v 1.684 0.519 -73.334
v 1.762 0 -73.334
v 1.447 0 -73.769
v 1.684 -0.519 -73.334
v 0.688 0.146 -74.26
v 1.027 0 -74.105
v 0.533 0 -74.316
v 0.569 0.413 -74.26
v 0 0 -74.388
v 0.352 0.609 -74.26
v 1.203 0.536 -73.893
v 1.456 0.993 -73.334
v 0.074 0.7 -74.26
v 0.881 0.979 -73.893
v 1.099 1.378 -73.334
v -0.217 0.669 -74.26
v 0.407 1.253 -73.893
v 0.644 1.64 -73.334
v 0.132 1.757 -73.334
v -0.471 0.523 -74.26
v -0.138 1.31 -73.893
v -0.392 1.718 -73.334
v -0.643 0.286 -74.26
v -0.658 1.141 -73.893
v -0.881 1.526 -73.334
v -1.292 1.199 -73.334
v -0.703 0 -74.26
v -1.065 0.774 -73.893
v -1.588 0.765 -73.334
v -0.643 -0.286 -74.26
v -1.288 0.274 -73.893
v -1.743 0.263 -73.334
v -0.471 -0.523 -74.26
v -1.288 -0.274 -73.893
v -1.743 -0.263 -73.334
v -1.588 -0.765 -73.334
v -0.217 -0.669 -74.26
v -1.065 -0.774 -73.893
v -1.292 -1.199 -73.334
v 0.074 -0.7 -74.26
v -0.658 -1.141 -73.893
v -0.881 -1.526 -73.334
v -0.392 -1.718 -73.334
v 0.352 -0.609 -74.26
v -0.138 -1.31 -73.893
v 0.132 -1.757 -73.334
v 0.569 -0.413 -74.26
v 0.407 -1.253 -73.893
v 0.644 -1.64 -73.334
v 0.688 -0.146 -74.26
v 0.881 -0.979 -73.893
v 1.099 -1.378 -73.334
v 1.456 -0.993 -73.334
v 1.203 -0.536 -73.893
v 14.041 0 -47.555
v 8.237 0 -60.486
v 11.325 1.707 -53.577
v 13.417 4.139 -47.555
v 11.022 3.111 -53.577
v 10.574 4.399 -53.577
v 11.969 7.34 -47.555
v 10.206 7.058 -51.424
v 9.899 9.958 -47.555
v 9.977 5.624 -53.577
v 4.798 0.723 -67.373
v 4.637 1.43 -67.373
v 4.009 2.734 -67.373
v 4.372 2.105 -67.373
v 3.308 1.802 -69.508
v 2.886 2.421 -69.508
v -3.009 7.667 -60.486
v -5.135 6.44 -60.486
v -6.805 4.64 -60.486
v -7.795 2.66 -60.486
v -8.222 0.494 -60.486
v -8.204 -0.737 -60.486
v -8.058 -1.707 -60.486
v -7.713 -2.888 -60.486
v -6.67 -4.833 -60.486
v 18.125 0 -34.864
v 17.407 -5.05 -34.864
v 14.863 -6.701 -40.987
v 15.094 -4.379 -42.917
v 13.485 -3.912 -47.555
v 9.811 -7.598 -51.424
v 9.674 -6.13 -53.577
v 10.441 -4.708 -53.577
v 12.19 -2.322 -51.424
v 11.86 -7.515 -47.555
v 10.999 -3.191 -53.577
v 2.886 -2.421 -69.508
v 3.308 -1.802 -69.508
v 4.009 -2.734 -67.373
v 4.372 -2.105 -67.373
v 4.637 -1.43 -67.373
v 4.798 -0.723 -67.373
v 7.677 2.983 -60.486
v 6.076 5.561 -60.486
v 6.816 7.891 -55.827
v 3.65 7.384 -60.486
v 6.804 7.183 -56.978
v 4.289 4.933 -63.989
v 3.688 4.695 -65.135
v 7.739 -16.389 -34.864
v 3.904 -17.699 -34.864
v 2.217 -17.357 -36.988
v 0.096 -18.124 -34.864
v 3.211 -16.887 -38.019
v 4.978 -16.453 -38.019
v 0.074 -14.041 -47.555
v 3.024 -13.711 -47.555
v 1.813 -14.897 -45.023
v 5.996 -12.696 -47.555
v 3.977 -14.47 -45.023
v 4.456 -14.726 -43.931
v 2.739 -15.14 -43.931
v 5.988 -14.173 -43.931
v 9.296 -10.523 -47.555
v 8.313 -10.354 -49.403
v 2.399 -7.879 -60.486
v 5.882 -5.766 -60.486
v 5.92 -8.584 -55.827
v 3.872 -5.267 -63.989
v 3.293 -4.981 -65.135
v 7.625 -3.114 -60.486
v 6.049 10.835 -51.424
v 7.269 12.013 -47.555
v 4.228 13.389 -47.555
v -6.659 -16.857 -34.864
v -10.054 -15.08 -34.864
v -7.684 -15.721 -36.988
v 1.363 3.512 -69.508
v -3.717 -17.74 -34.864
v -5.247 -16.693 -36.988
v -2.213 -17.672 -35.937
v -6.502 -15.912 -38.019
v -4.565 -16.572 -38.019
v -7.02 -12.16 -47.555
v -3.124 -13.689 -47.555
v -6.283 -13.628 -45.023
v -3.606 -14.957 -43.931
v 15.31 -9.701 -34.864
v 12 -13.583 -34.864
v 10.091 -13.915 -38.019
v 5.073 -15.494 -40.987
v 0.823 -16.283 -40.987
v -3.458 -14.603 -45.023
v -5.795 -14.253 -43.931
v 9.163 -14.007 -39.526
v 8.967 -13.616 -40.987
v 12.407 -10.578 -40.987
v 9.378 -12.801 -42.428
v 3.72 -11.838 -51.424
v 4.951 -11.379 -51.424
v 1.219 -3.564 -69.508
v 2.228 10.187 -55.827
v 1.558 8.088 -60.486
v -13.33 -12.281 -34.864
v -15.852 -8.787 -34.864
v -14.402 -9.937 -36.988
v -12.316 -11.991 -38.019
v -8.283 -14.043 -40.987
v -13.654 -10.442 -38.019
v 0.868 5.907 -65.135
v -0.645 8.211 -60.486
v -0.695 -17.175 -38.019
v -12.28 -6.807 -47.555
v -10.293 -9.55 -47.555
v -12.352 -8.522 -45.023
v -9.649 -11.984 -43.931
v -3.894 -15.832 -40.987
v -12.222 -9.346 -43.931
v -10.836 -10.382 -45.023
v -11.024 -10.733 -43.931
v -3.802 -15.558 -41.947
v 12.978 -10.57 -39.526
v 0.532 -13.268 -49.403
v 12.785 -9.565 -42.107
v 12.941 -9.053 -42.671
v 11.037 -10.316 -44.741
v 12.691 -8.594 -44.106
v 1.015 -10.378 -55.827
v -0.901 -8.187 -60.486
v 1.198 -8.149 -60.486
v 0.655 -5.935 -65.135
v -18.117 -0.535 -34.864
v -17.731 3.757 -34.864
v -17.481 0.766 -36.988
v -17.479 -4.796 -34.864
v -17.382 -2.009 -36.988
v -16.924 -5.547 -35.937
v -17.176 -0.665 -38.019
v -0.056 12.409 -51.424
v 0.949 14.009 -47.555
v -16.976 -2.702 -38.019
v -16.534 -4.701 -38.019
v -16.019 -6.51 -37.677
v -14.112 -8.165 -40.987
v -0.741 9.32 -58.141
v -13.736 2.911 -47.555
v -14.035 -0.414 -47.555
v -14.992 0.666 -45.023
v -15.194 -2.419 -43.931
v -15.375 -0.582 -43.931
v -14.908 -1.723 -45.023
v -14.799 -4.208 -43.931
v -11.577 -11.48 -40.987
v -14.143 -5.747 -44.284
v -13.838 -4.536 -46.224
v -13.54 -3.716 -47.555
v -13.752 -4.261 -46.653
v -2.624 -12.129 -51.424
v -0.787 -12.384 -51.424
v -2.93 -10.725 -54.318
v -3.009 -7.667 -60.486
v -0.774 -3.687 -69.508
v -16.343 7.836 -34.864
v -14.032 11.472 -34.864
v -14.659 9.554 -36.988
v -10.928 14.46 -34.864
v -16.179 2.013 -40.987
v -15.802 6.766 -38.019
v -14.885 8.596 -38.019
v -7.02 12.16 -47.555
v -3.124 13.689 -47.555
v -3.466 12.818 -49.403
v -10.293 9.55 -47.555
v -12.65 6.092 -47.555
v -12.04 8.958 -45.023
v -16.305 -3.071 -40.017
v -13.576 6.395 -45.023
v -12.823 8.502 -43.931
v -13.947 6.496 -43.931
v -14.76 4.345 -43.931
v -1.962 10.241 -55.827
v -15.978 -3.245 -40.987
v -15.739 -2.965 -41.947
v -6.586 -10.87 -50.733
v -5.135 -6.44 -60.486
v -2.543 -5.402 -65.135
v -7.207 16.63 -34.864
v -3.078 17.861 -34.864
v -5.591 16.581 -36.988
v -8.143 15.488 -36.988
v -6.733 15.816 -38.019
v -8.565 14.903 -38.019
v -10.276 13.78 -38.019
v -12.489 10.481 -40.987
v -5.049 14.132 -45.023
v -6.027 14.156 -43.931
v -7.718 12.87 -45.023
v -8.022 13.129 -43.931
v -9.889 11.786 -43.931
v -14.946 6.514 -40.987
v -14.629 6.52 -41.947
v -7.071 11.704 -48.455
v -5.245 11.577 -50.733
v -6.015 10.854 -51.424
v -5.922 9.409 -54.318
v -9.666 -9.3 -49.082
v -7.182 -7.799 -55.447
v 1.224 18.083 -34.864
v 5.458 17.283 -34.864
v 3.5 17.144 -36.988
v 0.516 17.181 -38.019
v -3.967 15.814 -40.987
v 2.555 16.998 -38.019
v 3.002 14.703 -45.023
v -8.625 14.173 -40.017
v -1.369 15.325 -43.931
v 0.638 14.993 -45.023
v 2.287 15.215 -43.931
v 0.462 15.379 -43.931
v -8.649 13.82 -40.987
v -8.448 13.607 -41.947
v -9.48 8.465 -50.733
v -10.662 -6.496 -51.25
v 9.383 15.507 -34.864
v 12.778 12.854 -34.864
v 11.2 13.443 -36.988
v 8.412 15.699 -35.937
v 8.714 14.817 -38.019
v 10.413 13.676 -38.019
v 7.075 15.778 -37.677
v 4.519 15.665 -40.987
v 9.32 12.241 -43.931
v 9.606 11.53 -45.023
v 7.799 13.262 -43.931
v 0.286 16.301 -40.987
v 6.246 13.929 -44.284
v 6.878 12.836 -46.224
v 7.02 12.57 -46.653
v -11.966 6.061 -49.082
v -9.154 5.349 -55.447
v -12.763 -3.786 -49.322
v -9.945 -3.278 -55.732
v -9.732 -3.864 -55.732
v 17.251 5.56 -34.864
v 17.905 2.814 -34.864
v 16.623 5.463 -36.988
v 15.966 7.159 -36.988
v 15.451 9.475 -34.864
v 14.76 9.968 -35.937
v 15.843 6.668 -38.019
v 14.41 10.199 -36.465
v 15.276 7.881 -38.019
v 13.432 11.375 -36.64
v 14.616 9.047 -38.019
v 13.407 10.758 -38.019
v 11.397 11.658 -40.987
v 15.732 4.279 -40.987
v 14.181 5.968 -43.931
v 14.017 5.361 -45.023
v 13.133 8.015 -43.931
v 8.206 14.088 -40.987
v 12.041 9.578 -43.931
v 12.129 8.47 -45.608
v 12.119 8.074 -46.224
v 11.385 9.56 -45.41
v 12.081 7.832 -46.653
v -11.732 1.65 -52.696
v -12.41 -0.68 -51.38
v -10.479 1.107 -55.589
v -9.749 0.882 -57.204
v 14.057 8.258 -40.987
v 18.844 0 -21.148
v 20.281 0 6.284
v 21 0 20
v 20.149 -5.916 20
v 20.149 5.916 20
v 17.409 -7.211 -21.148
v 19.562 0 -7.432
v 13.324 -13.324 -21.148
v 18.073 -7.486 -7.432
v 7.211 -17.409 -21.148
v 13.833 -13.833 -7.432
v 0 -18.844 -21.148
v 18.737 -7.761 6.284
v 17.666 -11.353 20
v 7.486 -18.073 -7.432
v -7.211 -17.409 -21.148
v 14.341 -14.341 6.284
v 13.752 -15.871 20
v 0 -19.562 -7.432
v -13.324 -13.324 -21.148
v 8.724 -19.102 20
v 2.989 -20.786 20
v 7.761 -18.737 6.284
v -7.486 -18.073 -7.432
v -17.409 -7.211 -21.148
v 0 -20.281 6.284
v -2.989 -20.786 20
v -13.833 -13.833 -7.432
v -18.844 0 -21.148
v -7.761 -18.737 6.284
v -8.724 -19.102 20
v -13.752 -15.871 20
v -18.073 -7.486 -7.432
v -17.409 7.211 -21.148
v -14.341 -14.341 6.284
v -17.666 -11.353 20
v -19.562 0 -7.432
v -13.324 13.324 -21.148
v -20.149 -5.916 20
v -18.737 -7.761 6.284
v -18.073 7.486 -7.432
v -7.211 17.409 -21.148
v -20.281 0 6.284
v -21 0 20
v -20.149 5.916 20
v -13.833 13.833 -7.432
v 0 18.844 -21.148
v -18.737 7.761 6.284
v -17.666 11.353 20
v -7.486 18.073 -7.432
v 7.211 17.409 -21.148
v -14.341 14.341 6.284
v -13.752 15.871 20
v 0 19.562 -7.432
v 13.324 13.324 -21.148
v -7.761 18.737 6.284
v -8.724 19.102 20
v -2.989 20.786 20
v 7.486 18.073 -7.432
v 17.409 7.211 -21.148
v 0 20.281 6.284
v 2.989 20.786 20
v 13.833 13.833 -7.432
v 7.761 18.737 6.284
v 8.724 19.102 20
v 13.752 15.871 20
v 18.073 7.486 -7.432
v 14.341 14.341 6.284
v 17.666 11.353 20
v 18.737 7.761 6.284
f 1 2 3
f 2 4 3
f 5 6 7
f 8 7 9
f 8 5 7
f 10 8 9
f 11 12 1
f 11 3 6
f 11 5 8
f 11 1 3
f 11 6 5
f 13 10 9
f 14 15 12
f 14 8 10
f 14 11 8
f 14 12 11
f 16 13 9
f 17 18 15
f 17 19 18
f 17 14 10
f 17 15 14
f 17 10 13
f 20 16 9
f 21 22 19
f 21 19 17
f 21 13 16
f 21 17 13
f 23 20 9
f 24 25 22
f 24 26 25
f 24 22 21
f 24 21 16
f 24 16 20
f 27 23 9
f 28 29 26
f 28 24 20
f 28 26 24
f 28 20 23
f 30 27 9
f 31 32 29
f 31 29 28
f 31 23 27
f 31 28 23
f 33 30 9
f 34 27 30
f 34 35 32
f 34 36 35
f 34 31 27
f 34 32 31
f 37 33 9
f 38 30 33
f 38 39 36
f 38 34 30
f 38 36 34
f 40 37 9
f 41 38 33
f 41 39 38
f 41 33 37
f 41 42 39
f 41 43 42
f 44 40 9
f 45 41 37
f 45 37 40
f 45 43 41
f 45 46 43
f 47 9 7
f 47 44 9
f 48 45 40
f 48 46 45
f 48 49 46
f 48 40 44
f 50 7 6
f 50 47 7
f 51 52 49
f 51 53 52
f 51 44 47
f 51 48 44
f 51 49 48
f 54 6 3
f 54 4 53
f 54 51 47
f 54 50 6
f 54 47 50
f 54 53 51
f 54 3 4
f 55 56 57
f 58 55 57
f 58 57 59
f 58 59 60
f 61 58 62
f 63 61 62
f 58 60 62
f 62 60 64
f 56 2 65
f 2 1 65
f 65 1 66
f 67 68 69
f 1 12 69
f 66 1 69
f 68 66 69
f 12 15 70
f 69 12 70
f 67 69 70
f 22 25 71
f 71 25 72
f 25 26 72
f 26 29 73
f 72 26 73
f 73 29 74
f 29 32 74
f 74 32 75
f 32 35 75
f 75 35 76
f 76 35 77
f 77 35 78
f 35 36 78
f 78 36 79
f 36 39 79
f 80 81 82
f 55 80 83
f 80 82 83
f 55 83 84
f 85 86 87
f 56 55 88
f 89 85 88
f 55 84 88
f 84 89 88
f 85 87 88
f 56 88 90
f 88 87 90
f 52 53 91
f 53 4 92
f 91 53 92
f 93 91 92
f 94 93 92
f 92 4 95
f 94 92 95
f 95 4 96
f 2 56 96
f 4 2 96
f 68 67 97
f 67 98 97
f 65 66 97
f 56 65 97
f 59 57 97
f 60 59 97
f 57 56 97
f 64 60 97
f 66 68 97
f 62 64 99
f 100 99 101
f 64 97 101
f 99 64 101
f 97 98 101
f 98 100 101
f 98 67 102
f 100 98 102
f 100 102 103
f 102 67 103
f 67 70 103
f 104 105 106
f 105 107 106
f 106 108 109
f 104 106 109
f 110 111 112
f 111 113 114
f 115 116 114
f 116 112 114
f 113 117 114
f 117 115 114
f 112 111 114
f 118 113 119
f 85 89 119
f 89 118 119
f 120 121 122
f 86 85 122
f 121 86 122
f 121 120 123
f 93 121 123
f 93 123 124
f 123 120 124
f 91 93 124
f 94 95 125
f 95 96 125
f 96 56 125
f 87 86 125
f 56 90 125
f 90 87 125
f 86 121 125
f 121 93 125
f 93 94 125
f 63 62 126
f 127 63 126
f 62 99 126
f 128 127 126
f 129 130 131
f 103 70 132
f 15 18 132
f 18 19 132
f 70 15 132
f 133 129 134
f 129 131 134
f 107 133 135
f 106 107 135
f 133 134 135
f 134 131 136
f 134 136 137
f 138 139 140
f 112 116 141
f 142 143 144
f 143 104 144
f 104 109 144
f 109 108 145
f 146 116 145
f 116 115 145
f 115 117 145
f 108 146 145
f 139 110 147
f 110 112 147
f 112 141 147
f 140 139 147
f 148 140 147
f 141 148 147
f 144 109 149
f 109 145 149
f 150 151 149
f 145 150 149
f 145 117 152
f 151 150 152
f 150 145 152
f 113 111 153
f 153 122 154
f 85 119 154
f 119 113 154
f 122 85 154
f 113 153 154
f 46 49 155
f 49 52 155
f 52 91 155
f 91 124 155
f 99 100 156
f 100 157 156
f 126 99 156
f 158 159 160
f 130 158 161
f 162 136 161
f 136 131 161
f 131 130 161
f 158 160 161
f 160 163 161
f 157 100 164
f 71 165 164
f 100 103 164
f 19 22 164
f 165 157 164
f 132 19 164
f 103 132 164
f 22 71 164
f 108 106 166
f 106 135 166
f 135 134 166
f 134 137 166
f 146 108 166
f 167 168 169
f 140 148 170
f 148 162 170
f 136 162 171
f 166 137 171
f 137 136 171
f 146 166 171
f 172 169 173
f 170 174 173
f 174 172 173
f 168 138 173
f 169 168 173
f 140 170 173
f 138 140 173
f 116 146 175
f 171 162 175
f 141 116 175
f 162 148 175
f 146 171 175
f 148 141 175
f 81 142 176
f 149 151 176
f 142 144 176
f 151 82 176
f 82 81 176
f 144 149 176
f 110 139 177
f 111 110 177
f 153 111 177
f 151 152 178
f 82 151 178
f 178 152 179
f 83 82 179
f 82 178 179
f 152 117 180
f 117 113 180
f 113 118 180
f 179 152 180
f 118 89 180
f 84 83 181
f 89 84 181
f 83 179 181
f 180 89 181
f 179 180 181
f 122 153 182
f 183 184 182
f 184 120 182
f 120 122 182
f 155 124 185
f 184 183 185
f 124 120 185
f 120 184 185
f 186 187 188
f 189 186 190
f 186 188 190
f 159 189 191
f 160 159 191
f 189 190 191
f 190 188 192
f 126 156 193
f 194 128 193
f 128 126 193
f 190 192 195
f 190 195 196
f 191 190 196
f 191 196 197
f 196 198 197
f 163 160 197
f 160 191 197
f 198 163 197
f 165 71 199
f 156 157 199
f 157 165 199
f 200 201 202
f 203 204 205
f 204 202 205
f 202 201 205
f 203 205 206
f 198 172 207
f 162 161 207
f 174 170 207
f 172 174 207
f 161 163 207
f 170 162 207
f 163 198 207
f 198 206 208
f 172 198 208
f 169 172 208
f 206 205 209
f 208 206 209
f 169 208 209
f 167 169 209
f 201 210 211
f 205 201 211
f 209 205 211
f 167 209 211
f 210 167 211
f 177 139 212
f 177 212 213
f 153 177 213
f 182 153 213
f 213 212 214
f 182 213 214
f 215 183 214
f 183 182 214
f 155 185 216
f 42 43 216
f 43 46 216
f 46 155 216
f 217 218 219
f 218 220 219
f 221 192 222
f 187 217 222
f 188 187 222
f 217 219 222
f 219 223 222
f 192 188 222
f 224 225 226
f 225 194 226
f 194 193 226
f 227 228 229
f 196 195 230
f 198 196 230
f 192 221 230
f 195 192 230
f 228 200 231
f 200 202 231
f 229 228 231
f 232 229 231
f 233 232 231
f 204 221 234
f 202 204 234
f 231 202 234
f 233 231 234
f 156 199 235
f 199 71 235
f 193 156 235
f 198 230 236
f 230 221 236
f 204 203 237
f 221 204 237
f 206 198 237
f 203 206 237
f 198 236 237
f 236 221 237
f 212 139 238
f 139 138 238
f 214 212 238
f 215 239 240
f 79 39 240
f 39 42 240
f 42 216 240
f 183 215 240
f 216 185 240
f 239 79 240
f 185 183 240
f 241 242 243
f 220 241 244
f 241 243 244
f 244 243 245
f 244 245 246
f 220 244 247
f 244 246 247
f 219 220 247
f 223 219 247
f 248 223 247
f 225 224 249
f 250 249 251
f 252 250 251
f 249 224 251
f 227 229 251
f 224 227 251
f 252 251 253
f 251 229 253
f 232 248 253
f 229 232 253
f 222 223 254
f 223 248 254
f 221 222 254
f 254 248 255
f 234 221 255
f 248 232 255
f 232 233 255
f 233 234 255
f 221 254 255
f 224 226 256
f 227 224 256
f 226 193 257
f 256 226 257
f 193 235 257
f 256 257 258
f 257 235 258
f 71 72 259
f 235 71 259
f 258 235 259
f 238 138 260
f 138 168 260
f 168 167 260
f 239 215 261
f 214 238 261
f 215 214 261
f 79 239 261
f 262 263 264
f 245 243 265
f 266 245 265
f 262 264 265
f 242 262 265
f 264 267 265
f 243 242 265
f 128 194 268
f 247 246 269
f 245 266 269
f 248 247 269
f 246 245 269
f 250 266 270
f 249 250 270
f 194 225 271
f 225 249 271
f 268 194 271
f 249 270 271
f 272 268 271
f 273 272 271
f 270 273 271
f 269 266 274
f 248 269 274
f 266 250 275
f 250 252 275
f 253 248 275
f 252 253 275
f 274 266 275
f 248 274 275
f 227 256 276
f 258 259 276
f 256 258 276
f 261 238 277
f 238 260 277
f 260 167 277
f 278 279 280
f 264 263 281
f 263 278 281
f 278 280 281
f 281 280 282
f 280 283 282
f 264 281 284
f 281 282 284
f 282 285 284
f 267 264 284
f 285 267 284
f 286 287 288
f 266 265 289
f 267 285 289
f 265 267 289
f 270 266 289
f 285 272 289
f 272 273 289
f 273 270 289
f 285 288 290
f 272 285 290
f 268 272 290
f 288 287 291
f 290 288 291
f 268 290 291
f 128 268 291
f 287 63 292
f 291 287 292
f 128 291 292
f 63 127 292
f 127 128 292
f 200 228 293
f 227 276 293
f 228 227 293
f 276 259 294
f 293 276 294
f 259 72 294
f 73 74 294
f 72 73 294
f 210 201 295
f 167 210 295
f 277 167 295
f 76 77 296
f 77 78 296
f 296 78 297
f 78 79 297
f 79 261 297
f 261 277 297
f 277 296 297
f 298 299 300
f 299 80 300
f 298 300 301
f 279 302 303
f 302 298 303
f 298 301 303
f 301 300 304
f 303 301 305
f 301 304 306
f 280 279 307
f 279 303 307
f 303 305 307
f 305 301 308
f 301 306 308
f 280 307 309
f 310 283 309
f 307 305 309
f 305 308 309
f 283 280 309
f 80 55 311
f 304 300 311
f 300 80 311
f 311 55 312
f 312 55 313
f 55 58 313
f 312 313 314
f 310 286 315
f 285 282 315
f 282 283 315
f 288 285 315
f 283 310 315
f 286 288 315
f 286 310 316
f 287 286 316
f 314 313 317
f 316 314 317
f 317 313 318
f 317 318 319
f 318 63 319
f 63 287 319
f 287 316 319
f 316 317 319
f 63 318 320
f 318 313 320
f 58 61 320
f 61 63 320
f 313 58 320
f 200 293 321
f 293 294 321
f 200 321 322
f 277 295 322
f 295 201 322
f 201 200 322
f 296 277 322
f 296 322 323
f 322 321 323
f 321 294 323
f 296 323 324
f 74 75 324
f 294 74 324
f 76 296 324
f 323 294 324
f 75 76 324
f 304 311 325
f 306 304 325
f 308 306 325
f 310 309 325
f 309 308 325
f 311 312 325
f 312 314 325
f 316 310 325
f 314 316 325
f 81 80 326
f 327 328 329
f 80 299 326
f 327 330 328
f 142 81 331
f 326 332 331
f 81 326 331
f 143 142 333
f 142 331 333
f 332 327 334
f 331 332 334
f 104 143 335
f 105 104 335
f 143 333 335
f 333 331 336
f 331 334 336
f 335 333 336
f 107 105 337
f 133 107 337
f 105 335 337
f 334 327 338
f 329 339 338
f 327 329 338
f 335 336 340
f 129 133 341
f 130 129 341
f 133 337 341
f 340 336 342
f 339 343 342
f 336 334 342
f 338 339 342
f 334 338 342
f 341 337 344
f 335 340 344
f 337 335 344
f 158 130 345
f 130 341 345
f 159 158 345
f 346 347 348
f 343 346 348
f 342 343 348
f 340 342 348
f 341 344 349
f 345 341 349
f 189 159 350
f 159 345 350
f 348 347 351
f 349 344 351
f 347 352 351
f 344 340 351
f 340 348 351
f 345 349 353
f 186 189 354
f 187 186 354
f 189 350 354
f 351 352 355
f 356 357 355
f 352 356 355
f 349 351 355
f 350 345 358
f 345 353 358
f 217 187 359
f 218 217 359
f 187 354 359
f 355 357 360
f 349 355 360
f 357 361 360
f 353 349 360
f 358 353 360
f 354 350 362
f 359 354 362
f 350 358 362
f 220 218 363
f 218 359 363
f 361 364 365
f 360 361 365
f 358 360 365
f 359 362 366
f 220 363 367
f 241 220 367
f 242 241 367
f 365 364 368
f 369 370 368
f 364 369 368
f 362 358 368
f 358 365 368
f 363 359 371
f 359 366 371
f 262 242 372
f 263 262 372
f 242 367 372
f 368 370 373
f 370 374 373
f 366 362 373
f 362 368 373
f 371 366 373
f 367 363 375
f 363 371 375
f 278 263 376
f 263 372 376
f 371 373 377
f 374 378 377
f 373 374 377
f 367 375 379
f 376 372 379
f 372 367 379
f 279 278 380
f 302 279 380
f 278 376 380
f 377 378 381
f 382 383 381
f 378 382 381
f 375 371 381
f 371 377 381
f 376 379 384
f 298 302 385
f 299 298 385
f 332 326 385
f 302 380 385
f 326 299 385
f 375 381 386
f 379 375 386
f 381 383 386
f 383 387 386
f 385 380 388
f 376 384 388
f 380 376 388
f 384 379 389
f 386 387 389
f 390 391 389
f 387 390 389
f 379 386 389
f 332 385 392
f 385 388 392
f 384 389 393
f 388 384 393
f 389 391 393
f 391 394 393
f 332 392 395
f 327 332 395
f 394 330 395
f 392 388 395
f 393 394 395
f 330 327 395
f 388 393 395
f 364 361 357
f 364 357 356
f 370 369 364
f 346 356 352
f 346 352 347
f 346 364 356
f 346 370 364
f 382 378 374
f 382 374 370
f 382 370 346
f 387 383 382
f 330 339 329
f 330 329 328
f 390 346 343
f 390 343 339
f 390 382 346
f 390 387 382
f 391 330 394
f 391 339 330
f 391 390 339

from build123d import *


with BuildPart() as part:
    # Эскиз1 → Повернуть1 (revolve)
    with BuildSketch(Plane(origin=(0, 0, 0), x_dir=(1, 0, 0), z_dir=(0, 1, 0))):
        with BuildLine():
            Line((-21, -20), (0, -20))
            Line((0, -20), (0, 76.509456591))
            add(Edge.make_bspline(
                [(-21, 23.303526799), (-20.950151988, 23.55619715), (-20.588242456, 25.356689417), (-19.861805291, 28.542980585), (-18.781007648, 32.618309393), (-17.683803917, 36.387694686), (-16.794111183, 39.324775715), (-16.139995318, 41.546015667), (-15.635538449, 43.197589032), (-15.024163935, 45.012380328), (-13.937228163, 47.886209516), (-11.955046686, 52.531179902), (-8.996626021, 58.945239937), (-6.340494309, 64.415530495), (-4.283171781, 68.509695264), (-2.81904039, 71.351111958), (-1.479938004, 73.873249362), (-0.567336195, 75.524317414), (-0.112134261, 76.316693352), (0, 76.509456591)],
                knots=[0.246223276, 0.246223276, 0.246223276, 0.246223276, 0.255865129, 0.31540599, 0.374946852, 0.434487714, 0.494028576, 0.523799007, 0.553569438, 0.583339868, 0.613110299, 0.672651161, 0.732192023, 0.791732885, 0.821503316, 0.851273747, 0.881044177, 0.910814608, 0.921120543, 0.921120543, 0.921120543, 0.921120543], degree=3))
            Line((-21, 23.303526799), (-21, -20))
        make_face()
    revolve(axis=Axis((0, 0, -76.509456591), (0, 0, 1)))

    # Эскиз2 → Вырез-Повернуть1 (revolve, cut)
    with BuildSketch(Plane(origin=(0, 0, 0), x_dir=(1, 0, 0), z_dir=(0, 1, 0))):
        Polygon((21, -20), (21, 66.971973821), (16.441991992, 66.971973821), align=None)
    revolve(axis=Axis((0, 0, 20), (0, 0, -1)), mode=Mode.SUBTRACT)

    # Эскиз3 → Вырез-Повернуть2 (revolve, cut)
    with BuildSketch(Plane(origin=(0, 0, 0), x_dir=(1, 0, 0), z_dir=(0, 1, 0))):
        with BuildLine():
            Line((1e-08, 76.509474859), (1e-08, 74.388246536))
            ThreePointArc((1e-08, 74.388246536), (1.026734817, 74.10458439), (1.762223825, 73.334062167))
            Line((1.762223825, 73.334062167), (4.025925166, 73.334062167))
            Line((4.025925166, 73.334062167), (4.025925166, 76.509474859))
            Line((4.025925166, 76.509474859), (1e-08, 76.509474859))
        make_face()
    revolve(axis=Axis((1e-08, 0, -76.509474859), (0, 0, 1)), mode=Mode.SUBTRACT)


solid = part.part
